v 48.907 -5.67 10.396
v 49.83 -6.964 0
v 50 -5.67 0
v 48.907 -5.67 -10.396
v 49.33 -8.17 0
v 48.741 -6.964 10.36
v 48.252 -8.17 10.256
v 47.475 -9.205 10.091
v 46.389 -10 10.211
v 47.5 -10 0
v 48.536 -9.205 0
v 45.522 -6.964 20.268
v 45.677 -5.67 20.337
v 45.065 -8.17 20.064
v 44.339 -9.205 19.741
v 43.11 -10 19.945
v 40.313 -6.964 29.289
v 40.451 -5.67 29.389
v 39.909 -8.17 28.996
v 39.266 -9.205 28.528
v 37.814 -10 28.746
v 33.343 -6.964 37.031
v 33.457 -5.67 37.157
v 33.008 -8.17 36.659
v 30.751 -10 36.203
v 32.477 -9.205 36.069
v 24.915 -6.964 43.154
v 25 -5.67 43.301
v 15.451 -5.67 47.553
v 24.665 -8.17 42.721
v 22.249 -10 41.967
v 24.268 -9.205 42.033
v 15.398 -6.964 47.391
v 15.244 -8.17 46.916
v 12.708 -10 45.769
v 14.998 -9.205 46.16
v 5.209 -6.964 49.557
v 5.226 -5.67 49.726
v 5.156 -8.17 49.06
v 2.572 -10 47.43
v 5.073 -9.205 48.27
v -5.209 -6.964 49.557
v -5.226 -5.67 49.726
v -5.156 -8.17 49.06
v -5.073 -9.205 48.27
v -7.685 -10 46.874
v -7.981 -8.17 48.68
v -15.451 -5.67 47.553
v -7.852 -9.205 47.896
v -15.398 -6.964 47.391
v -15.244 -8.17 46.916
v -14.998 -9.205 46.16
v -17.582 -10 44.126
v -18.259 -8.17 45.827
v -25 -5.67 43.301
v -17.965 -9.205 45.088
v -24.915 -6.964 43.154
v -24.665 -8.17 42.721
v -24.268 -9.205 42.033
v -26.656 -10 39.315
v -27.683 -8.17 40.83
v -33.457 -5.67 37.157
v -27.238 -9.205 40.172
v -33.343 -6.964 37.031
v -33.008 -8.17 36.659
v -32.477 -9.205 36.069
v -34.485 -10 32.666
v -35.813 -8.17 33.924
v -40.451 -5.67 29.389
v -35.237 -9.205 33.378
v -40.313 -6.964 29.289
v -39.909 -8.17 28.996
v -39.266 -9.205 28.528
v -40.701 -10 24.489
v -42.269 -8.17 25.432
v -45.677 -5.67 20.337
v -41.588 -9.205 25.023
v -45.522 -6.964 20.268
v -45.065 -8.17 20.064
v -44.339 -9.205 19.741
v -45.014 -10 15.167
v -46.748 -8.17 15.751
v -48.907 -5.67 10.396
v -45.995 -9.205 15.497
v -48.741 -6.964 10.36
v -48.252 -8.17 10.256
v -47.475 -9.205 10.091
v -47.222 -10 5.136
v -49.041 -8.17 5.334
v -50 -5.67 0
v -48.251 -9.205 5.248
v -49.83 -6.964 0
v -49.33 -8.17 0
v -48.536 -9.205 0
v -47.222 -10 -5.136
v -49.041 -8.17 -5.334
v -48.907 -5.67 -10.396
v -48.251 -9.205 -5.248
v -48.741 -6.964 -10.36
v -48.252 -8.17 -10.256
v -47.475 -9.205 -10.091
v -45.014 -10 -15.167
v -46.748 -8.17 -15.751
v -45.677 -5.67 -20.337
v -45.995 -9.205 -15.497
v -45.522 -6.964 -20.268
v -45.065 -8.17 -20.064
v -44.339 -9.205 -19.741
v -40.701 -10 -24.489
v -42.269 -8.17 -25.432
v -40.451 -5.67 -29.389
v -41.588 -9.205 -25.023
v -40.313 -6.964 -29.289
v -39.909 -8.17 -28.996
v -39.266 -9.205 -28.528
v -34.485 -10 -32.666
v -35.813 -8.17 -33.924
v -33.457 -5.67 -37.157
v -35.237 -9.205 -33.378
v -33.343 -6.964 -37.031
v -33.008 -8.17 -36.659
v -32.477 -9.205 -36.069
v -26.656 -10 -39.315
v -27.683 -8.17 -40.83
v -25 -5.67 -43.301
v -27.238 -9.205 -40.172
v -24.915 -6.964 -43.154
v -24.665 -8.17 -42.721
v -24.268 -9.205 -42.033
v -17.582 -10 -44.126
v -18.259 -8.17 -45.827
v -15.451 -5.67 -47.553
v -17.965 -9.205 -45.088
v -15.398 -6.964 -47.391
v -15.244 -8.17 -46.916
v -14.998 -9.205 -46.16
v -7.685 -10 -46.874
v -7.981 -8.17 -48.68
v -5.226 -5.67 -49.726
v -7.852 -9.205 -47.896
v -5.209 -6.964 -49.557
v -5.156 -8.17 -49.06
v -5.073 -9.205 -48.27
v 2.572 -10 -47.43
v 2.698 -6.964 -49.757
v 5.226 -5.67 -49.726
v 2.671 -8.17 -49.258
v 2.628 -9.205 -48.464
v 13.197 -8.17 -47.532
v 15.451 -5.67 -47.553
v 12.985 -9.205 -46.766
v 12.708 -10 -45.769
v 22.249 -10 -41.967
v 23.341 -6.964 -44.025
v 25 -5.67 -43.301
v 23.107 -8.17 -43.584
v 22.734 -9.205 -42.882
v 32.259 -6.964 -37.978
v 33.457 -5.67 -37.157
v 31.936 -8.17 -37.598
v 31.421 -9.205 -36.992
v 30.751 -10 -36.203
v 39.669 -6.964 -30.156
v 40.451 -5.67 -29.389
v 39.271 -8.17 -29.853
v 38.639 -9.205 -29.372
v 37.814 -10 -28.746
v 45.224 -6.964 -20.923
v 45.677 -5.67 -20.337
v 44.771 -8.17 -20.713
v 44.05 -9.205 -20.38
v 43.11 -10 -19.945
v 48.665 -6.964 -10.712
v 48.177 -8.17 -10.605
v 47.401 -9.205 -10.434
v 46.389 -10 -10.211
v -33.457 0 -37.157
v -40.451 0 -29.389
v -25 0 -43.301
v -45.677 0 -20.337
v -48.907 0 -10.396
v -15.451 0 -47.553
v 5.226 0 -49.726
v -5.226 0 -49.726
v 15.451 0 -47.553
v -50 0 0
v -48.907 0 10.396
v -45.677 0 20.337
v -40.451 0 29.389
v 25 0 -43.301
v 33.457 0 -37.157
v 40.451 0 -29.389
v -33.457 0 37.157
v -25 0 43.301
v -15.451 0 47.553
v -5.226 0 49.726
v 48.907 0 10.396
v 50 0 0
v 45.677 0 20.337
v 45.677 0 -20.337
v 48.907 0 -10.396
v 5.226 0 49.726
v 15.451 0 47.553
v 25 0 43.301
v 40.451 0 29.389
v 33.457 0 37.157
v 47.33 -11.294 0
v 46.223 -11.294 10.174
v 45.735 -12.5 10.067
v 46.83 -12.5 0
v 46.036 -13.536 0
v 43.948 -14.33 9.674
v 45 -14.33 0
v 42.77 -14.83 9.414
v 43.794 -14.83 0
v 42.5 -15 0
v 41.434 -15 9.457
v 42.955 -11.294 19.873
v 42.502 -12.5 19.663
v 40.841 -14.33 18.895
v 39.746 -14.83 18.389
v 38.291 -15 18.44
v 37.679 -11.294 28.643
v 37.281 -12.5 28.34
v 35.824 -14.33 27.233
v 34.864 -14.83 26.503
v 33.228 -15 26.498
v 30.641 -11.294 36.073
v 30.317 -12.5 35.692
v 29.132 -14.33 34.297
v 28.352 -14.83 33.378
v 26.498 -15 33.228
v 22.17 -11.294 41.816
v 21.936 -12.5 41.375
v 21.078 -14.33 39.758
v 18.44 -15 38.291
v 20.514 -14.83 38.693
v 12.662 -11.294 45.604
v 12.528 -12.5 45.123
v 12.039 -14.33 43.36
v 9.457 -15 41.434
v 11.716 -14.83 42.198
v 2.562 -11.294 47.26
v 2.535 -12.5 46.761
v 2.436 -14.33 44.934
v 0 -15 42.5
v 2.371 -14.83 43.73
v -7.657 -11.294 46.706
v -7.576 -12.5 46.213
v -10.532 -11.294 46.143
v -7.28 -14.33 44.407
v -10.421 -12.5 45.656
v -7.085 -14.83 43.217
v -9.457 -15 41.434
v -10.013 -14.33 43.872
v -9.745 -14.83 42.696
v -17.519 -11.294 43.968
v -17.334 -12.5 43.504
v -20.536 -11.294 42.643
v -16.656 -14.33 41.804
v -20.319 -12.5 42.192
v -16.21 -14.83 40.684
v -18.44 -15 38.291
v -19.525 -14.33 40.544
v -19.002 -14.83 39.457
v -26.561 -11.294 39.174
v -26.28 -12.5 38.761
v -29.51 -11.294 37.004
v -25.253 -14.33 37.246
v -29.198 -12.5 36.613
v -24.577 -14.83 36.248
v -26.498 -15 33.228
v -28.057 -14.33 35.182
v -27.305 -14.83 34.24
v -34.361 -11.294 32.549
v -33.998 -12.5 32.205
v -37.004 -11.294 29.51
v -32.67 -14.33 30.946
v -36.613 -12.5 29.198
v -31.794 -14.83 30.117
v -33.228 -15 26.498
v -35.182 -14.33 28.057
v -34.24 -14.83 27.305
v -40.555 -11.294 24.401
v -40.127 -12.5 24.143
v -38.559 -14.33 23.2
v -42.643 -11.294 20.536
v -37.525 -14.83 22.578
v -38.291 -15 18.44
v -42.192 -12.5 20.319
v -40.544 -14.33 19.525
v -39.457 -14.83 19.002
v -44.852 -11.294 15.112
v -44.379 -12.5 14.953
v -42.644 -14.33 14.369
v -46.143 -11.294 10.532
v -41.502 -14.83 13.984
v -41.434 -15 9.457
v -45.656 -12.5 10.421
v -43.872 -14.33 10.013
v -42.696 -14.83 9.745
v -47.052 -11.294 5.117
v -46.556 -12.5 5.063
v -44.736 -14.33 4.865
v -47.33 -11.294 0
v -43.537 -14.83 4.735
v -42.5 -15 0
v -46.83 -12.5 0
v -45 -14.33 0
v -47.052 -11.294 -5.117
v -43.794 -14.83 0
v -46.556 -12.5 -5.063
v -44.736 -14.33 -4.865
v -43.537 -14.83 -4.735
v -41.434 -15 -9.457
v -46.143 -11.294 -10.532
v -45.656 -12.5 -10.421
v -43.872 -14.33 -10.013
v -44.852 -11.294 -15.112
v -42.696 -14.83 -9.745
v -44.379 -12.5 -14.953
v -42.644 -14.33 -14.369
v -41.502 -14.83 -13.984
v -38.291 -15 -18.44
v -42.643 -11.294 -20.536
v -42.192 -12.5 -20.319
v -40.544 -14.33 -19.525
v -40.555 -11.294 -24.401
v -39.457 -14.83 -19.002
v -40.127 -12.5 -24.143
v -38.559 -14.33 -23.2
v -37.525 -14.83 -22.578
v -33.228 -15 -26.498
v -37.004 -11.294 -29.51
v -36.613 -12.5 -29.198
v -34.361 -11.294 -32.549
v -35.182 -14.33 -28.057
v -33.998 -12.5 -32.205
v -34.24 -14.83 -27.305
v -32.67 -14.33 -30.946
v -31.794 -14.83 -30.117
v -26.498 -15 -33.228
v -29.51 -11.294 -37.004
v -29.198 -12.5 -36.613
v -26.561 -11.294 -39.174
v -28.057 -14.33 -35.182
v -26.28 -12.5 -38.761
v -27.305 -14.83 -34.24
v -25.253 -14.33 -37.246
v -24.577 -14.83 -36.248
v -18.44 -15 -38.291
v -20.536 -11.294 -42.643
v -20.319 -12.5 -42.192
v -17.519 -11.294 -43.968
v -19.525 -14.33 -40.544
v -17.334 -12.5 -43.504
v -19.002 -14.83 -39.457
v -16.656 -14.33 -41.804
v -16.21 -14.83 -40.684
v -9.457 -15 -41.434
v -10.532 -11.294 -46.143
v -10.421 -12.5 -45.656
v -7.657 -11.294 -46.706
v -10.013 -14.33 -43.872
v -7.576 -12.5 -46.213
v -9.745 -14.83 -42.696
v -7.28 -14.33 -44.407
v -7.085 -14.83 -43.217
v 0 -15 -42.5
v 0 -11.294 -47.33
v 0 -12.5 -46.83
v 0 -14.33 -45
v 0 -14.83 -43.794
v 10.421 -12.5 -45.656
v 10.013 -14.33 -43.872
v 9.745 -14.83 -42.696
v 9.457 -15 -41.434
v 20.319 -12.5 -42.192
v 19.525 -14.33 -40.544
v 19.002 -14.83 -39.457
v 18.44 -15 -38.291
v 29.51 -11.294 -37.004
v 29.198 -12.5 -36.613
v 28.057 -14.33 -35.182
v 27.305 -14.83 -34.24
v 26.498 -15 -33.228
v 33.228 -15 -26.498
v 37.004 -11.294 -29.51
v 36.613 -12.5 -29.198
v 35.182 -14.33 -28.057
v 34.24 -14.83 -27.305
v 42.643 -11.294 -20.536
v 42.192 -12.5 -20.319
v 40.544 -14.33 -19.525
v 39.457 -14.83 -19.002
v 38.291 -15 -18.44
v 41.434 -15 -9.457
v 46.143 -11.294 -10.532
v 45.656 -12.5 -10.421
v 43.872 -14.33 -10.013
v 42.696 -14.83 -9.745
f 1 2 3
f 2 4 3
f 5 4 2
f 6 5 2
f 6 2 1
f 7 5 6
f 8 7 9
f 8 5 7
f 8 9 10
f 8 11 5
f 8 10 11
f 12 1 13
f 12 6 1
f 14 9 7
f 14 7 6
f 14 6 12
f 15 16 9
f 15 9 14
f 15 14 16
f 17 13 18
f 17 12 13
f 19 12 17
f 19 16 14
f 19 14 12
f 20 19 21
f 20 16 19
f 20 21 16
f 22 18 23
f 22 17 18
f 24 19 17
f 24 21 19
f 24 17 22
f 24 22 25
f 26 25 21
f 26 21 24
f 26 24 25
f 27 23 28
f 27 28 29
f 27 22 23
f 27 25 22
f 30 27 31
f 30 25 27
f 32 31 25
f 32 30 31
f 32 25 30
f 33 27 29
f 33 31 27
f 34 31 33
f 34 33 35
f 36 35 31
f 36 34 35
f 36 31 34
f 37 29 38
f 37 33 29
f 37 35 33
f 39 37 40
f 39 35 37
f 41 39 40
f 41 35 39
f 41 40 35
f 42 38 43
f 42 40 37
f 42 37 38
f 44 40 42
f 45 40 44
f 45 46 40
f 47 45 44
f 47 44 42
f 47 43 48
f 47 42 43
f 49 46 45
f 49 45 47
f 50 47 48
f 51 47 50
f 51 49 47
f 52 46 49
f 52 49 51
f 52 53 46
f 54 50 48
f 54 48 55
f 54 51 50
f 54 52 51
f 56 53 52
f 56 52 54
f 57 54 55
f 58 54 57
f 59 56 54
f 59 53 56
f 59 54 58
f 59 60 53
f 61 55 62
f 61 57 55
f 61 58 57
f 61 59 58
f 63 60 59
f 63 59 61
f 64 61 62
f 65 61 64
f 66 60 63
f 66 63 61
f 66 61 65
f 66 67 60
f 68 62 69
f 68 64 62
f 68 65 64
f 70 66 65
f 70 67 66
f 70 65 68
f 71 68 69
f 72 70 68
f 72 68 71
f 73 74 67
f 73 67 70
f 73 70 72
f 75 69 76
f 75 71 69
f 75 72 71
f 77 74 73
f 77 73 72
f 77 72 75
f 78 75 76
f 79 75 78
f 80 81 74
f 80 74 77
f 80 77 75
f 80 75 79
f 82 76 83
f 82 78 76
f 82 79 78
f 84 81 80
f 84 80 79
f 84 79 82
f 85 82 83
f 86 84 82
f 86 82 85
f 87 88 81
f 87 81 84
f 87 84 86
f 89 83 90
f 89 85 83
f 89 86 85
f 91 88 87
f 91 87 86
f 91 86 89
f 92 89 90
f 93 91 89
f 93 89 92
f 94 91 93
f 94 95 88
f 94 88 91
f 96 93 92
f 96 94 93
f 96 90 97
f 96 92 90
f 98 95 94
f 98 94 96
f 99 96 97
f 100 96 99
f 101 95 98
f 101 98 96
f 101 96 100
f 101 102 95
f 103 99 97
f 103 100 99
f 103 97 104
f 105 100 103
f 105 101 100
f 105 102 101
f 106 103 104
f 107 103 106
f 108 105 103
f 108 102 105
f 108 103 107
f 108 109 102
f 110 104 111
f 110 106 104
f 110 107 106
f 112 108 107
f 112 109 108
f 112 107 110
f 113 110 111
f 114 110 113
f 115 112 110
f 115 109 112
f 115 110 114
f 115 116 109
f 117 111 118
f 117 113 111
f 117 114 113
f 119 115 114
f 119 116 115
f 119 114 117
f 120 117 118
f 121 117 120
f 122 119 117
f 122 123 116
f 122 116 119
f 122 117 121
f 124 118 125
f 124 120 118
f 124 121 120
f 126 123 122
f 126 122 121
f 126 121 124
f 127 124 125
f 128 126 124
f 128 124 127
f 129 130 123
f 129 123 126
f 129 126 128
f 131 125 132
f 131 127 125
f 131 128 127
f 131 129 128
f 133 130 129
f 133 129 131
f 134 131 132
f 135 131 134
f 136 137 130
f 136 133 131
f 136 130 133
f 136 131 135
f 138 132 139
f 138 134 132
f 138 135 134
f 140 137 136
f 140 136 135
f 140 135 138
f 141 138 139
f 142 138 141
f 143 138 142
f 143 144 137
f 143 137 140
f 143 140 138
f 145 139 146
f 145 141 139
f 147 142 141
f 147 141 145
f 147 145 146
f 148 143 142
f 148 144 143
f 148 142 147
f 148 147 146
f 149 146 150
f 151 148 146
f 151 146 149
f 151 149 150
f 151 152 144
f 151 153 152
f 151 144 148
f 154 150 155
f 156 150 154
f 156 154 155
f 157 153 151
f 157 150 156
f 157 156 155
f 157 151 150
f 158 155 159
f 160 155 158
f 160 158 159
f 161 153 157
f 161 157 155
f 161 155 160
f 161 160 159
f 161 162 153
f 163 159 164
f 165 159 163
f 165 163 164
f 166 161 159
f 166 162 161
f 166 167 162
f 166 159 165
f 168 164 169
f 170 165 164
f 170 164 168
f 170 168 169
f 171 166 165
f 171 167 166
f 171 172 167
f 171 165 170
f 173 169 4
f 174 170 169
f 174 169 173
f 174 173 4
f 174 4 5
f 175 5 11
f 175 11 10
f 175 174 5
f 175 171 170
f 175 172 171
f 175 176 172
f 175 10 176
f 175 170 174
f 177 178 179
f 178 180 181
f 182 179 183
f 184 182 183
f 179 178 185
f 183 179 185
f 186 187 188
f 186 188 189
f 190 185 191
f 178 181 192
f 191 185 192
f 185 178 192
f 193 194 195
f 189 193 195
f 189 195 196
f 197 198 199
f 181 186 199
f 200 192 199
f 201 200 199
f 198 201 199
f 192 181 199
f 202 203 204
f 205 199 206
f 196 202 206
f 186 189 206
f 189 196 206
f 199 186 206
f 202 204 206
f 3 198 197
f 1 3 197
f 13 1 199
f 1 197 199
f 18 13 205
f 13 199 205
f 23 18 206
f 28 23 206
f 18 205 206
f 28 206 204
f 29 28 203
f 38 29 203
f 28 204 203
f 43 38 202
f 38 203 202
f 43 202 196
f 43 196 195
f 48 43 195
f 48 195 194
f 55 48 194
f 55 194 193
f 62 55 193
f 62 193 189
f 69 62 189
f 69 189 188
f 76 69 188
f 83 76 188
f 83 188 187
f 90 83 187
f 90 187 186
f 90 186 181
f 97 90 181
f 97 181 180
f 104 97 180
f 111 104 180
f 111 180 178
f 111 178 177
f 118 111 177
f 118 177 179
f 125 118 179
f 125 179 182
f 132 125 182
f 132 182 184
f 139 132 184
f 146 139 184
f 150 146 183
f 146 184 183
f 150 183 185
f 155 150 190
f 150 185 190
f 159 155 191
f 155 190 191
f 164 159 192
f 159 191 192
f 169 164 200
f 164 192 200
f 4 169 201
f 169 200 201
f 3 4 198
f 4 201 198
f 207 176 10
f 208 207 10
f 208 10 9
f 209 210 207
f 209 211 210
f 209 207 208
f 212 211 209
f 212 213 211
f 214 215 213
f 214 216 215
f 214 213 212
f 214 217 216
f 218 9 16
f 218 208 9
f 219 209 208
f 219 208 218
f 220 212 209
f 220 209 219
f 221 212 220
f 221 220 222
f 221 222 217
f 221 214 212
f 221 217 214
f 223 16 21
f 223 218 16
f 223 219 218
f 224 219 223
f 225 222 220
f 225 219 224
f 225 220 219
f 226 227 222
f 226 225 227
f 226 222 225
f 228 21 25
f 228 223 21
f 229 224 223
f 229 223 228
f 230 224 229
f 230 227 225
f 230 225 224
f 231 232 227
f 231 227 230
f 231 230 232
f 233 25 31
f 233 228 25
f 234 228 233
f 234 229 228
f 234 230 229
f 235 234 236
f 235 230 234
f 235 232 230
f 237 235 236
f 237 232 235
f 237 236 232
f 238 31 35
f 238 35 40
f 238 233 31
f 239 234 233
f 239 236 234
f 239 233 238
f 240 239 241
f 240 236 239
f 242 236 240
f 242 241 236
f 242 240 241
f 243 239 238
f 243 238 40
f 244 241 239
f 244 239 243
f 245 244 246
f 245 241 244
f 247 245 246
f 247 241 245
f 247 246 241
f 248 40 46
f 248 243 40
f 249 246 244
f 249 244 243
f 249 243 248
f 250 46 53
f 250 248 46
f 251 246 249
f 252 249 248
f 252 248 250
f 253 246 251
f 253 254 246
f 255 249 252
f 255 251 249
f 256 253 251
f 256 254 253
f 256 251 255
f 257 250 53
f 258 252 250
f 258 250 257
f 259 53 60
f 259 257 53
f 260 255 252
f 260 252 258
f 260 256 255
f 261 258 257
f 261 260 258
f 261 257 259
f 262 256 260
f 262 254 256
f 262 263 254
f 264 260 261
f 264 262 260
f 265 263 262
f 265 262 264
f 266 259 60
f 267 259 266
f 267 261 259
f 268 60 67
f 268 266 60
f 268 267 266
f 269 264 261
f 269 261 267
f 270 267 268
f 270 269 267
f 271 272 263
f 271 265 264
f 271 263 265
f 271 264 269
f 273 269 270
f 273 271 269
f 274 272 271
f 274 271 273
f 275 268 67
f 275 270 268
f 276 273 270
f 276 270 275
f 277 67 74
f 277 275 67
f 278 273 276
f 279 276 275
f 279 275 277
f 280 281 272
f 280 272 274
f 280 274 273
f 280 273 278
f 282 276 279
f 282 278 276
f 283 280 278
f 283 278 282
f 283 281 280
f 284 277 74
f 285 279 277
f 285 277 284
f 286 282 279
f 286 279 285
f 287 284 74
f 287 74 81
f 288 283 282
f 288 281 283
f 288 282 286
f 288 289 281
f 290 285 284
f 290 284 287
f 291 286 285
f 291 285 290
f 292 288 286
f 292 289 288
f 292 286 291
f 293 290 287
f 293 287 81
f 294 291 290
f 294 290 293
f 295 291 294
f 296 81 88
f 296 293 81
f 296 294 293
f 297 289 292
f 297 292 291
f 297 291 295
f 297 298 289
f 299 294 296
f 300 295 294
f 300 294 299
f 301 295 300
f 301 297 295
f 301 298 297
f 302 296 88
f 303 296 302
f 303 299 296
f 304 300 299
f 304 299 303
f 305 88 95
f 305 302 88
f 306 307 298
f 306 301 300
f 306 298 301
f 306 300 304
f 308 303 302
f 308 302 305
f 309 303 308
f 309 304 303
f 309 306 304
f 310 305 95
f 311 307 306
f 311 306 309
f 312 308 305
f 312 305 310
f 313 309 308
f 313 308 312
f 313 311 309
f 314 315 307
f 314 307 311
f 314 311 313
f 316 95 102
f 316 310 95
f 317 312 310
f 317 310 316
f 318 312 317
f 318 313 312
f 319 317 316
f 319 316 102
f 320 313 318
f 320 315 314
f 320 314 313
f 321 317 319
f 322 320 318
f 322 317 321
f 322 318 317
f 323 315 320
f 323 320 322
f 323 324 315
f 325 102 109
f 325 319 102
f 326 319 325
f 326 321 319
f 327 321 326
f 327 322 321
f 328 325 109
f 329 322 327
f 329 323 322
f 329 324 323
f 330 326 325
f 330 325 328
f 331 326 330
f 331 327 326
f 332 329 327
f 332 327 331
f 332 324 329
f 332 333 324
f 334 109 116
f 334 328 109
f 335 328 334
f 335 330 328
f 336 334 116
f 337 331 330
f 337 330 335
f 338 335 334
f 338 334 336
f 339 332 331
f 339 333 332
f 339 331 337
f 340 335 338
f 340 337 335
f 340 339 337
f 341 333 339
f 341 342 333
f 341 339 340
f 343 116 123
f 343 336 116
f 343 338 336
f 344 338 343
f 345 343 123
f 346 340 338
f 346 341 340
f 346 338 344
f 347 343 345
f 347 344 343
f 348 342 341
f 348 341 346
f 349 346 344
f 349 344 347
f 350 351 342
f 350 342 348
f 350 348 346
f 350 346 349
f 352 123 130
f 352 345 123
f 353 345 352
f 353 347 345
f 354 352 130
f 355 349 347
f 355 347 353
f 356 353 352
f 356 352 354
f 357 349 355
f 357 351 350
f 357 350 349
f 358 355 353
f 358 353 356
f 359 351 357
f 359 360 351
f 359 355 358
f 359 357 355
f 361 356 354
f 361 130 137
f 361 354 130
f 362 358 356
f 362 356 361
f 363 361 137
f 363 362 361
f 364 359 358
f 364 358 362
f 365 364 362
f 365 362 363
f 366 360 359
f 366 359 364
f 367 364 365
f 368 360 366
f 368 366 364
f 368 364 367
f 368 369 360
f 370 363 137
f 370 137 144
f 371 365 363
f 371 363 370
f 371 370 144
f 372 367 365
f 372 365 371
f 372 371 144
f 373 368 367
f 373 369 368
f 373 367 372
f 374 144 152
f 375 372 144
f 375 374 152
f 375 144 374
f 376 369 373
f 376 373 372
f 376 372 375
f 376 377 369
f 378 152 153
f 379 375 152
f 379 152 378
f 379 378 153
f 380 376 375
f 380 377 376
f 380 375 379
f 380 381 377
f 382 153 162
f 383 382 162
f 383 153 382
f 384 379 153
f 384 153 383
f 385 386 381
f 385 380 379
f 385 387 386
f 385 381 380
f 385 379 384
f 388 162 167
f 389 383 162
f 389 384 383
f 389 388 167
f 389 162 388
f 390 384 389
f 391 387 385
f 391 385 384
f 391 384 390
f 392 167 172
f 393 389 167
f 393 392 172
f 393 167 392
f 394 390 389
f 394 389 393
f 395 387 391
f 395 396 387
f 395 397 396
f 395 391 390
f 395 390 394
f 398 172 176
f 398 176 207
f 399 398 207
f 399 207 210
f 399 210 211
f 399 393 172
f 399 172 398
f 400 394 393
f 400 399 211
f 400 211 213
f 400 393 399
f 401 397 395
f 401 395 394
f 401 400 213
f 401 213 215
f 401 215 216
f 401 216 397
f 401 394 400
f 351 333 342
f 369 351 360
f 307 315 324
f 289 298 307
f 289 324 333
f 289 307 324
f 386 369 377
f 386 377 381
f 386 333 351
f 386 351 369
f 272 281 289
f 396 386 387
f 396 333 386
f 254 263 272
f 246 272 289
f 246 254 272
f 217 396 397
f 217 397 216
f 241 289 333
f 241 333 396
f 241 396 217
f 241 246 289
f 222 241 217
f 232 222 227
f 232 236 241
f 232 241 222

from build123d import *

# Parameters (mm, degrees)
F0_R     = 50
F1_DEPTH = 10
F2_R     = 47.5
F3_DEPTH = 5


# Not quite as in the source:
# - a fillet or chamfer that OpenCascade refuses, or shapes differently, is made with other operations: its cross-section is extruded or revolved along the edge and cut away or added


with BuildPart() as f1:
    # F0 (on Front) → F1 (new body)
    with BuildSketch(Plane.XZ):
        Circle(F0_R)
    extrude(amount=F1_DEPTH)

    # F2 (on face) → F3 (join)
    with BuildSketch(Plane.XZ.offset(10)):
        Circle(F2_R)
    extrude(amount=F3_DEPTH)

    # F4: fillet of radius 5 on 2 edges, made by hand

    # F4_s1 → F4_t2 (revolve, cut)
    with BuildSketch(Plane.XY):
        with BuildLine():
            ThreePointArc((50, -5.6698729811), (49.3301270189, -8.1698729811), (47.5, -10))
            Line((47.5, -10), (50, -10))
            Line((50, -10), (50, -5.6698729811))
        make_face()
    revolve(axis=Axis((0, -10, 0), (0, -1, 0)), mode=Mode.SUBTRACT)

    # F4_s3 → F4_t4 (revolve, cut)
    with BuildSketch(Plane.XY):
        with BuildLine():
            ThreePointArc((47.5, -10), (46.0355339059, -13.5355339059), (42.5, -15))
            Line((42.5, -15), (47.5, -15))
            Line((47.5, -15), (47.5, -10))
        make_face()
    revolve(axis=Axis((0, -15, 0), (0, -1, 0)), mode=Mode.SUBTRACT)


solid = f1.part
